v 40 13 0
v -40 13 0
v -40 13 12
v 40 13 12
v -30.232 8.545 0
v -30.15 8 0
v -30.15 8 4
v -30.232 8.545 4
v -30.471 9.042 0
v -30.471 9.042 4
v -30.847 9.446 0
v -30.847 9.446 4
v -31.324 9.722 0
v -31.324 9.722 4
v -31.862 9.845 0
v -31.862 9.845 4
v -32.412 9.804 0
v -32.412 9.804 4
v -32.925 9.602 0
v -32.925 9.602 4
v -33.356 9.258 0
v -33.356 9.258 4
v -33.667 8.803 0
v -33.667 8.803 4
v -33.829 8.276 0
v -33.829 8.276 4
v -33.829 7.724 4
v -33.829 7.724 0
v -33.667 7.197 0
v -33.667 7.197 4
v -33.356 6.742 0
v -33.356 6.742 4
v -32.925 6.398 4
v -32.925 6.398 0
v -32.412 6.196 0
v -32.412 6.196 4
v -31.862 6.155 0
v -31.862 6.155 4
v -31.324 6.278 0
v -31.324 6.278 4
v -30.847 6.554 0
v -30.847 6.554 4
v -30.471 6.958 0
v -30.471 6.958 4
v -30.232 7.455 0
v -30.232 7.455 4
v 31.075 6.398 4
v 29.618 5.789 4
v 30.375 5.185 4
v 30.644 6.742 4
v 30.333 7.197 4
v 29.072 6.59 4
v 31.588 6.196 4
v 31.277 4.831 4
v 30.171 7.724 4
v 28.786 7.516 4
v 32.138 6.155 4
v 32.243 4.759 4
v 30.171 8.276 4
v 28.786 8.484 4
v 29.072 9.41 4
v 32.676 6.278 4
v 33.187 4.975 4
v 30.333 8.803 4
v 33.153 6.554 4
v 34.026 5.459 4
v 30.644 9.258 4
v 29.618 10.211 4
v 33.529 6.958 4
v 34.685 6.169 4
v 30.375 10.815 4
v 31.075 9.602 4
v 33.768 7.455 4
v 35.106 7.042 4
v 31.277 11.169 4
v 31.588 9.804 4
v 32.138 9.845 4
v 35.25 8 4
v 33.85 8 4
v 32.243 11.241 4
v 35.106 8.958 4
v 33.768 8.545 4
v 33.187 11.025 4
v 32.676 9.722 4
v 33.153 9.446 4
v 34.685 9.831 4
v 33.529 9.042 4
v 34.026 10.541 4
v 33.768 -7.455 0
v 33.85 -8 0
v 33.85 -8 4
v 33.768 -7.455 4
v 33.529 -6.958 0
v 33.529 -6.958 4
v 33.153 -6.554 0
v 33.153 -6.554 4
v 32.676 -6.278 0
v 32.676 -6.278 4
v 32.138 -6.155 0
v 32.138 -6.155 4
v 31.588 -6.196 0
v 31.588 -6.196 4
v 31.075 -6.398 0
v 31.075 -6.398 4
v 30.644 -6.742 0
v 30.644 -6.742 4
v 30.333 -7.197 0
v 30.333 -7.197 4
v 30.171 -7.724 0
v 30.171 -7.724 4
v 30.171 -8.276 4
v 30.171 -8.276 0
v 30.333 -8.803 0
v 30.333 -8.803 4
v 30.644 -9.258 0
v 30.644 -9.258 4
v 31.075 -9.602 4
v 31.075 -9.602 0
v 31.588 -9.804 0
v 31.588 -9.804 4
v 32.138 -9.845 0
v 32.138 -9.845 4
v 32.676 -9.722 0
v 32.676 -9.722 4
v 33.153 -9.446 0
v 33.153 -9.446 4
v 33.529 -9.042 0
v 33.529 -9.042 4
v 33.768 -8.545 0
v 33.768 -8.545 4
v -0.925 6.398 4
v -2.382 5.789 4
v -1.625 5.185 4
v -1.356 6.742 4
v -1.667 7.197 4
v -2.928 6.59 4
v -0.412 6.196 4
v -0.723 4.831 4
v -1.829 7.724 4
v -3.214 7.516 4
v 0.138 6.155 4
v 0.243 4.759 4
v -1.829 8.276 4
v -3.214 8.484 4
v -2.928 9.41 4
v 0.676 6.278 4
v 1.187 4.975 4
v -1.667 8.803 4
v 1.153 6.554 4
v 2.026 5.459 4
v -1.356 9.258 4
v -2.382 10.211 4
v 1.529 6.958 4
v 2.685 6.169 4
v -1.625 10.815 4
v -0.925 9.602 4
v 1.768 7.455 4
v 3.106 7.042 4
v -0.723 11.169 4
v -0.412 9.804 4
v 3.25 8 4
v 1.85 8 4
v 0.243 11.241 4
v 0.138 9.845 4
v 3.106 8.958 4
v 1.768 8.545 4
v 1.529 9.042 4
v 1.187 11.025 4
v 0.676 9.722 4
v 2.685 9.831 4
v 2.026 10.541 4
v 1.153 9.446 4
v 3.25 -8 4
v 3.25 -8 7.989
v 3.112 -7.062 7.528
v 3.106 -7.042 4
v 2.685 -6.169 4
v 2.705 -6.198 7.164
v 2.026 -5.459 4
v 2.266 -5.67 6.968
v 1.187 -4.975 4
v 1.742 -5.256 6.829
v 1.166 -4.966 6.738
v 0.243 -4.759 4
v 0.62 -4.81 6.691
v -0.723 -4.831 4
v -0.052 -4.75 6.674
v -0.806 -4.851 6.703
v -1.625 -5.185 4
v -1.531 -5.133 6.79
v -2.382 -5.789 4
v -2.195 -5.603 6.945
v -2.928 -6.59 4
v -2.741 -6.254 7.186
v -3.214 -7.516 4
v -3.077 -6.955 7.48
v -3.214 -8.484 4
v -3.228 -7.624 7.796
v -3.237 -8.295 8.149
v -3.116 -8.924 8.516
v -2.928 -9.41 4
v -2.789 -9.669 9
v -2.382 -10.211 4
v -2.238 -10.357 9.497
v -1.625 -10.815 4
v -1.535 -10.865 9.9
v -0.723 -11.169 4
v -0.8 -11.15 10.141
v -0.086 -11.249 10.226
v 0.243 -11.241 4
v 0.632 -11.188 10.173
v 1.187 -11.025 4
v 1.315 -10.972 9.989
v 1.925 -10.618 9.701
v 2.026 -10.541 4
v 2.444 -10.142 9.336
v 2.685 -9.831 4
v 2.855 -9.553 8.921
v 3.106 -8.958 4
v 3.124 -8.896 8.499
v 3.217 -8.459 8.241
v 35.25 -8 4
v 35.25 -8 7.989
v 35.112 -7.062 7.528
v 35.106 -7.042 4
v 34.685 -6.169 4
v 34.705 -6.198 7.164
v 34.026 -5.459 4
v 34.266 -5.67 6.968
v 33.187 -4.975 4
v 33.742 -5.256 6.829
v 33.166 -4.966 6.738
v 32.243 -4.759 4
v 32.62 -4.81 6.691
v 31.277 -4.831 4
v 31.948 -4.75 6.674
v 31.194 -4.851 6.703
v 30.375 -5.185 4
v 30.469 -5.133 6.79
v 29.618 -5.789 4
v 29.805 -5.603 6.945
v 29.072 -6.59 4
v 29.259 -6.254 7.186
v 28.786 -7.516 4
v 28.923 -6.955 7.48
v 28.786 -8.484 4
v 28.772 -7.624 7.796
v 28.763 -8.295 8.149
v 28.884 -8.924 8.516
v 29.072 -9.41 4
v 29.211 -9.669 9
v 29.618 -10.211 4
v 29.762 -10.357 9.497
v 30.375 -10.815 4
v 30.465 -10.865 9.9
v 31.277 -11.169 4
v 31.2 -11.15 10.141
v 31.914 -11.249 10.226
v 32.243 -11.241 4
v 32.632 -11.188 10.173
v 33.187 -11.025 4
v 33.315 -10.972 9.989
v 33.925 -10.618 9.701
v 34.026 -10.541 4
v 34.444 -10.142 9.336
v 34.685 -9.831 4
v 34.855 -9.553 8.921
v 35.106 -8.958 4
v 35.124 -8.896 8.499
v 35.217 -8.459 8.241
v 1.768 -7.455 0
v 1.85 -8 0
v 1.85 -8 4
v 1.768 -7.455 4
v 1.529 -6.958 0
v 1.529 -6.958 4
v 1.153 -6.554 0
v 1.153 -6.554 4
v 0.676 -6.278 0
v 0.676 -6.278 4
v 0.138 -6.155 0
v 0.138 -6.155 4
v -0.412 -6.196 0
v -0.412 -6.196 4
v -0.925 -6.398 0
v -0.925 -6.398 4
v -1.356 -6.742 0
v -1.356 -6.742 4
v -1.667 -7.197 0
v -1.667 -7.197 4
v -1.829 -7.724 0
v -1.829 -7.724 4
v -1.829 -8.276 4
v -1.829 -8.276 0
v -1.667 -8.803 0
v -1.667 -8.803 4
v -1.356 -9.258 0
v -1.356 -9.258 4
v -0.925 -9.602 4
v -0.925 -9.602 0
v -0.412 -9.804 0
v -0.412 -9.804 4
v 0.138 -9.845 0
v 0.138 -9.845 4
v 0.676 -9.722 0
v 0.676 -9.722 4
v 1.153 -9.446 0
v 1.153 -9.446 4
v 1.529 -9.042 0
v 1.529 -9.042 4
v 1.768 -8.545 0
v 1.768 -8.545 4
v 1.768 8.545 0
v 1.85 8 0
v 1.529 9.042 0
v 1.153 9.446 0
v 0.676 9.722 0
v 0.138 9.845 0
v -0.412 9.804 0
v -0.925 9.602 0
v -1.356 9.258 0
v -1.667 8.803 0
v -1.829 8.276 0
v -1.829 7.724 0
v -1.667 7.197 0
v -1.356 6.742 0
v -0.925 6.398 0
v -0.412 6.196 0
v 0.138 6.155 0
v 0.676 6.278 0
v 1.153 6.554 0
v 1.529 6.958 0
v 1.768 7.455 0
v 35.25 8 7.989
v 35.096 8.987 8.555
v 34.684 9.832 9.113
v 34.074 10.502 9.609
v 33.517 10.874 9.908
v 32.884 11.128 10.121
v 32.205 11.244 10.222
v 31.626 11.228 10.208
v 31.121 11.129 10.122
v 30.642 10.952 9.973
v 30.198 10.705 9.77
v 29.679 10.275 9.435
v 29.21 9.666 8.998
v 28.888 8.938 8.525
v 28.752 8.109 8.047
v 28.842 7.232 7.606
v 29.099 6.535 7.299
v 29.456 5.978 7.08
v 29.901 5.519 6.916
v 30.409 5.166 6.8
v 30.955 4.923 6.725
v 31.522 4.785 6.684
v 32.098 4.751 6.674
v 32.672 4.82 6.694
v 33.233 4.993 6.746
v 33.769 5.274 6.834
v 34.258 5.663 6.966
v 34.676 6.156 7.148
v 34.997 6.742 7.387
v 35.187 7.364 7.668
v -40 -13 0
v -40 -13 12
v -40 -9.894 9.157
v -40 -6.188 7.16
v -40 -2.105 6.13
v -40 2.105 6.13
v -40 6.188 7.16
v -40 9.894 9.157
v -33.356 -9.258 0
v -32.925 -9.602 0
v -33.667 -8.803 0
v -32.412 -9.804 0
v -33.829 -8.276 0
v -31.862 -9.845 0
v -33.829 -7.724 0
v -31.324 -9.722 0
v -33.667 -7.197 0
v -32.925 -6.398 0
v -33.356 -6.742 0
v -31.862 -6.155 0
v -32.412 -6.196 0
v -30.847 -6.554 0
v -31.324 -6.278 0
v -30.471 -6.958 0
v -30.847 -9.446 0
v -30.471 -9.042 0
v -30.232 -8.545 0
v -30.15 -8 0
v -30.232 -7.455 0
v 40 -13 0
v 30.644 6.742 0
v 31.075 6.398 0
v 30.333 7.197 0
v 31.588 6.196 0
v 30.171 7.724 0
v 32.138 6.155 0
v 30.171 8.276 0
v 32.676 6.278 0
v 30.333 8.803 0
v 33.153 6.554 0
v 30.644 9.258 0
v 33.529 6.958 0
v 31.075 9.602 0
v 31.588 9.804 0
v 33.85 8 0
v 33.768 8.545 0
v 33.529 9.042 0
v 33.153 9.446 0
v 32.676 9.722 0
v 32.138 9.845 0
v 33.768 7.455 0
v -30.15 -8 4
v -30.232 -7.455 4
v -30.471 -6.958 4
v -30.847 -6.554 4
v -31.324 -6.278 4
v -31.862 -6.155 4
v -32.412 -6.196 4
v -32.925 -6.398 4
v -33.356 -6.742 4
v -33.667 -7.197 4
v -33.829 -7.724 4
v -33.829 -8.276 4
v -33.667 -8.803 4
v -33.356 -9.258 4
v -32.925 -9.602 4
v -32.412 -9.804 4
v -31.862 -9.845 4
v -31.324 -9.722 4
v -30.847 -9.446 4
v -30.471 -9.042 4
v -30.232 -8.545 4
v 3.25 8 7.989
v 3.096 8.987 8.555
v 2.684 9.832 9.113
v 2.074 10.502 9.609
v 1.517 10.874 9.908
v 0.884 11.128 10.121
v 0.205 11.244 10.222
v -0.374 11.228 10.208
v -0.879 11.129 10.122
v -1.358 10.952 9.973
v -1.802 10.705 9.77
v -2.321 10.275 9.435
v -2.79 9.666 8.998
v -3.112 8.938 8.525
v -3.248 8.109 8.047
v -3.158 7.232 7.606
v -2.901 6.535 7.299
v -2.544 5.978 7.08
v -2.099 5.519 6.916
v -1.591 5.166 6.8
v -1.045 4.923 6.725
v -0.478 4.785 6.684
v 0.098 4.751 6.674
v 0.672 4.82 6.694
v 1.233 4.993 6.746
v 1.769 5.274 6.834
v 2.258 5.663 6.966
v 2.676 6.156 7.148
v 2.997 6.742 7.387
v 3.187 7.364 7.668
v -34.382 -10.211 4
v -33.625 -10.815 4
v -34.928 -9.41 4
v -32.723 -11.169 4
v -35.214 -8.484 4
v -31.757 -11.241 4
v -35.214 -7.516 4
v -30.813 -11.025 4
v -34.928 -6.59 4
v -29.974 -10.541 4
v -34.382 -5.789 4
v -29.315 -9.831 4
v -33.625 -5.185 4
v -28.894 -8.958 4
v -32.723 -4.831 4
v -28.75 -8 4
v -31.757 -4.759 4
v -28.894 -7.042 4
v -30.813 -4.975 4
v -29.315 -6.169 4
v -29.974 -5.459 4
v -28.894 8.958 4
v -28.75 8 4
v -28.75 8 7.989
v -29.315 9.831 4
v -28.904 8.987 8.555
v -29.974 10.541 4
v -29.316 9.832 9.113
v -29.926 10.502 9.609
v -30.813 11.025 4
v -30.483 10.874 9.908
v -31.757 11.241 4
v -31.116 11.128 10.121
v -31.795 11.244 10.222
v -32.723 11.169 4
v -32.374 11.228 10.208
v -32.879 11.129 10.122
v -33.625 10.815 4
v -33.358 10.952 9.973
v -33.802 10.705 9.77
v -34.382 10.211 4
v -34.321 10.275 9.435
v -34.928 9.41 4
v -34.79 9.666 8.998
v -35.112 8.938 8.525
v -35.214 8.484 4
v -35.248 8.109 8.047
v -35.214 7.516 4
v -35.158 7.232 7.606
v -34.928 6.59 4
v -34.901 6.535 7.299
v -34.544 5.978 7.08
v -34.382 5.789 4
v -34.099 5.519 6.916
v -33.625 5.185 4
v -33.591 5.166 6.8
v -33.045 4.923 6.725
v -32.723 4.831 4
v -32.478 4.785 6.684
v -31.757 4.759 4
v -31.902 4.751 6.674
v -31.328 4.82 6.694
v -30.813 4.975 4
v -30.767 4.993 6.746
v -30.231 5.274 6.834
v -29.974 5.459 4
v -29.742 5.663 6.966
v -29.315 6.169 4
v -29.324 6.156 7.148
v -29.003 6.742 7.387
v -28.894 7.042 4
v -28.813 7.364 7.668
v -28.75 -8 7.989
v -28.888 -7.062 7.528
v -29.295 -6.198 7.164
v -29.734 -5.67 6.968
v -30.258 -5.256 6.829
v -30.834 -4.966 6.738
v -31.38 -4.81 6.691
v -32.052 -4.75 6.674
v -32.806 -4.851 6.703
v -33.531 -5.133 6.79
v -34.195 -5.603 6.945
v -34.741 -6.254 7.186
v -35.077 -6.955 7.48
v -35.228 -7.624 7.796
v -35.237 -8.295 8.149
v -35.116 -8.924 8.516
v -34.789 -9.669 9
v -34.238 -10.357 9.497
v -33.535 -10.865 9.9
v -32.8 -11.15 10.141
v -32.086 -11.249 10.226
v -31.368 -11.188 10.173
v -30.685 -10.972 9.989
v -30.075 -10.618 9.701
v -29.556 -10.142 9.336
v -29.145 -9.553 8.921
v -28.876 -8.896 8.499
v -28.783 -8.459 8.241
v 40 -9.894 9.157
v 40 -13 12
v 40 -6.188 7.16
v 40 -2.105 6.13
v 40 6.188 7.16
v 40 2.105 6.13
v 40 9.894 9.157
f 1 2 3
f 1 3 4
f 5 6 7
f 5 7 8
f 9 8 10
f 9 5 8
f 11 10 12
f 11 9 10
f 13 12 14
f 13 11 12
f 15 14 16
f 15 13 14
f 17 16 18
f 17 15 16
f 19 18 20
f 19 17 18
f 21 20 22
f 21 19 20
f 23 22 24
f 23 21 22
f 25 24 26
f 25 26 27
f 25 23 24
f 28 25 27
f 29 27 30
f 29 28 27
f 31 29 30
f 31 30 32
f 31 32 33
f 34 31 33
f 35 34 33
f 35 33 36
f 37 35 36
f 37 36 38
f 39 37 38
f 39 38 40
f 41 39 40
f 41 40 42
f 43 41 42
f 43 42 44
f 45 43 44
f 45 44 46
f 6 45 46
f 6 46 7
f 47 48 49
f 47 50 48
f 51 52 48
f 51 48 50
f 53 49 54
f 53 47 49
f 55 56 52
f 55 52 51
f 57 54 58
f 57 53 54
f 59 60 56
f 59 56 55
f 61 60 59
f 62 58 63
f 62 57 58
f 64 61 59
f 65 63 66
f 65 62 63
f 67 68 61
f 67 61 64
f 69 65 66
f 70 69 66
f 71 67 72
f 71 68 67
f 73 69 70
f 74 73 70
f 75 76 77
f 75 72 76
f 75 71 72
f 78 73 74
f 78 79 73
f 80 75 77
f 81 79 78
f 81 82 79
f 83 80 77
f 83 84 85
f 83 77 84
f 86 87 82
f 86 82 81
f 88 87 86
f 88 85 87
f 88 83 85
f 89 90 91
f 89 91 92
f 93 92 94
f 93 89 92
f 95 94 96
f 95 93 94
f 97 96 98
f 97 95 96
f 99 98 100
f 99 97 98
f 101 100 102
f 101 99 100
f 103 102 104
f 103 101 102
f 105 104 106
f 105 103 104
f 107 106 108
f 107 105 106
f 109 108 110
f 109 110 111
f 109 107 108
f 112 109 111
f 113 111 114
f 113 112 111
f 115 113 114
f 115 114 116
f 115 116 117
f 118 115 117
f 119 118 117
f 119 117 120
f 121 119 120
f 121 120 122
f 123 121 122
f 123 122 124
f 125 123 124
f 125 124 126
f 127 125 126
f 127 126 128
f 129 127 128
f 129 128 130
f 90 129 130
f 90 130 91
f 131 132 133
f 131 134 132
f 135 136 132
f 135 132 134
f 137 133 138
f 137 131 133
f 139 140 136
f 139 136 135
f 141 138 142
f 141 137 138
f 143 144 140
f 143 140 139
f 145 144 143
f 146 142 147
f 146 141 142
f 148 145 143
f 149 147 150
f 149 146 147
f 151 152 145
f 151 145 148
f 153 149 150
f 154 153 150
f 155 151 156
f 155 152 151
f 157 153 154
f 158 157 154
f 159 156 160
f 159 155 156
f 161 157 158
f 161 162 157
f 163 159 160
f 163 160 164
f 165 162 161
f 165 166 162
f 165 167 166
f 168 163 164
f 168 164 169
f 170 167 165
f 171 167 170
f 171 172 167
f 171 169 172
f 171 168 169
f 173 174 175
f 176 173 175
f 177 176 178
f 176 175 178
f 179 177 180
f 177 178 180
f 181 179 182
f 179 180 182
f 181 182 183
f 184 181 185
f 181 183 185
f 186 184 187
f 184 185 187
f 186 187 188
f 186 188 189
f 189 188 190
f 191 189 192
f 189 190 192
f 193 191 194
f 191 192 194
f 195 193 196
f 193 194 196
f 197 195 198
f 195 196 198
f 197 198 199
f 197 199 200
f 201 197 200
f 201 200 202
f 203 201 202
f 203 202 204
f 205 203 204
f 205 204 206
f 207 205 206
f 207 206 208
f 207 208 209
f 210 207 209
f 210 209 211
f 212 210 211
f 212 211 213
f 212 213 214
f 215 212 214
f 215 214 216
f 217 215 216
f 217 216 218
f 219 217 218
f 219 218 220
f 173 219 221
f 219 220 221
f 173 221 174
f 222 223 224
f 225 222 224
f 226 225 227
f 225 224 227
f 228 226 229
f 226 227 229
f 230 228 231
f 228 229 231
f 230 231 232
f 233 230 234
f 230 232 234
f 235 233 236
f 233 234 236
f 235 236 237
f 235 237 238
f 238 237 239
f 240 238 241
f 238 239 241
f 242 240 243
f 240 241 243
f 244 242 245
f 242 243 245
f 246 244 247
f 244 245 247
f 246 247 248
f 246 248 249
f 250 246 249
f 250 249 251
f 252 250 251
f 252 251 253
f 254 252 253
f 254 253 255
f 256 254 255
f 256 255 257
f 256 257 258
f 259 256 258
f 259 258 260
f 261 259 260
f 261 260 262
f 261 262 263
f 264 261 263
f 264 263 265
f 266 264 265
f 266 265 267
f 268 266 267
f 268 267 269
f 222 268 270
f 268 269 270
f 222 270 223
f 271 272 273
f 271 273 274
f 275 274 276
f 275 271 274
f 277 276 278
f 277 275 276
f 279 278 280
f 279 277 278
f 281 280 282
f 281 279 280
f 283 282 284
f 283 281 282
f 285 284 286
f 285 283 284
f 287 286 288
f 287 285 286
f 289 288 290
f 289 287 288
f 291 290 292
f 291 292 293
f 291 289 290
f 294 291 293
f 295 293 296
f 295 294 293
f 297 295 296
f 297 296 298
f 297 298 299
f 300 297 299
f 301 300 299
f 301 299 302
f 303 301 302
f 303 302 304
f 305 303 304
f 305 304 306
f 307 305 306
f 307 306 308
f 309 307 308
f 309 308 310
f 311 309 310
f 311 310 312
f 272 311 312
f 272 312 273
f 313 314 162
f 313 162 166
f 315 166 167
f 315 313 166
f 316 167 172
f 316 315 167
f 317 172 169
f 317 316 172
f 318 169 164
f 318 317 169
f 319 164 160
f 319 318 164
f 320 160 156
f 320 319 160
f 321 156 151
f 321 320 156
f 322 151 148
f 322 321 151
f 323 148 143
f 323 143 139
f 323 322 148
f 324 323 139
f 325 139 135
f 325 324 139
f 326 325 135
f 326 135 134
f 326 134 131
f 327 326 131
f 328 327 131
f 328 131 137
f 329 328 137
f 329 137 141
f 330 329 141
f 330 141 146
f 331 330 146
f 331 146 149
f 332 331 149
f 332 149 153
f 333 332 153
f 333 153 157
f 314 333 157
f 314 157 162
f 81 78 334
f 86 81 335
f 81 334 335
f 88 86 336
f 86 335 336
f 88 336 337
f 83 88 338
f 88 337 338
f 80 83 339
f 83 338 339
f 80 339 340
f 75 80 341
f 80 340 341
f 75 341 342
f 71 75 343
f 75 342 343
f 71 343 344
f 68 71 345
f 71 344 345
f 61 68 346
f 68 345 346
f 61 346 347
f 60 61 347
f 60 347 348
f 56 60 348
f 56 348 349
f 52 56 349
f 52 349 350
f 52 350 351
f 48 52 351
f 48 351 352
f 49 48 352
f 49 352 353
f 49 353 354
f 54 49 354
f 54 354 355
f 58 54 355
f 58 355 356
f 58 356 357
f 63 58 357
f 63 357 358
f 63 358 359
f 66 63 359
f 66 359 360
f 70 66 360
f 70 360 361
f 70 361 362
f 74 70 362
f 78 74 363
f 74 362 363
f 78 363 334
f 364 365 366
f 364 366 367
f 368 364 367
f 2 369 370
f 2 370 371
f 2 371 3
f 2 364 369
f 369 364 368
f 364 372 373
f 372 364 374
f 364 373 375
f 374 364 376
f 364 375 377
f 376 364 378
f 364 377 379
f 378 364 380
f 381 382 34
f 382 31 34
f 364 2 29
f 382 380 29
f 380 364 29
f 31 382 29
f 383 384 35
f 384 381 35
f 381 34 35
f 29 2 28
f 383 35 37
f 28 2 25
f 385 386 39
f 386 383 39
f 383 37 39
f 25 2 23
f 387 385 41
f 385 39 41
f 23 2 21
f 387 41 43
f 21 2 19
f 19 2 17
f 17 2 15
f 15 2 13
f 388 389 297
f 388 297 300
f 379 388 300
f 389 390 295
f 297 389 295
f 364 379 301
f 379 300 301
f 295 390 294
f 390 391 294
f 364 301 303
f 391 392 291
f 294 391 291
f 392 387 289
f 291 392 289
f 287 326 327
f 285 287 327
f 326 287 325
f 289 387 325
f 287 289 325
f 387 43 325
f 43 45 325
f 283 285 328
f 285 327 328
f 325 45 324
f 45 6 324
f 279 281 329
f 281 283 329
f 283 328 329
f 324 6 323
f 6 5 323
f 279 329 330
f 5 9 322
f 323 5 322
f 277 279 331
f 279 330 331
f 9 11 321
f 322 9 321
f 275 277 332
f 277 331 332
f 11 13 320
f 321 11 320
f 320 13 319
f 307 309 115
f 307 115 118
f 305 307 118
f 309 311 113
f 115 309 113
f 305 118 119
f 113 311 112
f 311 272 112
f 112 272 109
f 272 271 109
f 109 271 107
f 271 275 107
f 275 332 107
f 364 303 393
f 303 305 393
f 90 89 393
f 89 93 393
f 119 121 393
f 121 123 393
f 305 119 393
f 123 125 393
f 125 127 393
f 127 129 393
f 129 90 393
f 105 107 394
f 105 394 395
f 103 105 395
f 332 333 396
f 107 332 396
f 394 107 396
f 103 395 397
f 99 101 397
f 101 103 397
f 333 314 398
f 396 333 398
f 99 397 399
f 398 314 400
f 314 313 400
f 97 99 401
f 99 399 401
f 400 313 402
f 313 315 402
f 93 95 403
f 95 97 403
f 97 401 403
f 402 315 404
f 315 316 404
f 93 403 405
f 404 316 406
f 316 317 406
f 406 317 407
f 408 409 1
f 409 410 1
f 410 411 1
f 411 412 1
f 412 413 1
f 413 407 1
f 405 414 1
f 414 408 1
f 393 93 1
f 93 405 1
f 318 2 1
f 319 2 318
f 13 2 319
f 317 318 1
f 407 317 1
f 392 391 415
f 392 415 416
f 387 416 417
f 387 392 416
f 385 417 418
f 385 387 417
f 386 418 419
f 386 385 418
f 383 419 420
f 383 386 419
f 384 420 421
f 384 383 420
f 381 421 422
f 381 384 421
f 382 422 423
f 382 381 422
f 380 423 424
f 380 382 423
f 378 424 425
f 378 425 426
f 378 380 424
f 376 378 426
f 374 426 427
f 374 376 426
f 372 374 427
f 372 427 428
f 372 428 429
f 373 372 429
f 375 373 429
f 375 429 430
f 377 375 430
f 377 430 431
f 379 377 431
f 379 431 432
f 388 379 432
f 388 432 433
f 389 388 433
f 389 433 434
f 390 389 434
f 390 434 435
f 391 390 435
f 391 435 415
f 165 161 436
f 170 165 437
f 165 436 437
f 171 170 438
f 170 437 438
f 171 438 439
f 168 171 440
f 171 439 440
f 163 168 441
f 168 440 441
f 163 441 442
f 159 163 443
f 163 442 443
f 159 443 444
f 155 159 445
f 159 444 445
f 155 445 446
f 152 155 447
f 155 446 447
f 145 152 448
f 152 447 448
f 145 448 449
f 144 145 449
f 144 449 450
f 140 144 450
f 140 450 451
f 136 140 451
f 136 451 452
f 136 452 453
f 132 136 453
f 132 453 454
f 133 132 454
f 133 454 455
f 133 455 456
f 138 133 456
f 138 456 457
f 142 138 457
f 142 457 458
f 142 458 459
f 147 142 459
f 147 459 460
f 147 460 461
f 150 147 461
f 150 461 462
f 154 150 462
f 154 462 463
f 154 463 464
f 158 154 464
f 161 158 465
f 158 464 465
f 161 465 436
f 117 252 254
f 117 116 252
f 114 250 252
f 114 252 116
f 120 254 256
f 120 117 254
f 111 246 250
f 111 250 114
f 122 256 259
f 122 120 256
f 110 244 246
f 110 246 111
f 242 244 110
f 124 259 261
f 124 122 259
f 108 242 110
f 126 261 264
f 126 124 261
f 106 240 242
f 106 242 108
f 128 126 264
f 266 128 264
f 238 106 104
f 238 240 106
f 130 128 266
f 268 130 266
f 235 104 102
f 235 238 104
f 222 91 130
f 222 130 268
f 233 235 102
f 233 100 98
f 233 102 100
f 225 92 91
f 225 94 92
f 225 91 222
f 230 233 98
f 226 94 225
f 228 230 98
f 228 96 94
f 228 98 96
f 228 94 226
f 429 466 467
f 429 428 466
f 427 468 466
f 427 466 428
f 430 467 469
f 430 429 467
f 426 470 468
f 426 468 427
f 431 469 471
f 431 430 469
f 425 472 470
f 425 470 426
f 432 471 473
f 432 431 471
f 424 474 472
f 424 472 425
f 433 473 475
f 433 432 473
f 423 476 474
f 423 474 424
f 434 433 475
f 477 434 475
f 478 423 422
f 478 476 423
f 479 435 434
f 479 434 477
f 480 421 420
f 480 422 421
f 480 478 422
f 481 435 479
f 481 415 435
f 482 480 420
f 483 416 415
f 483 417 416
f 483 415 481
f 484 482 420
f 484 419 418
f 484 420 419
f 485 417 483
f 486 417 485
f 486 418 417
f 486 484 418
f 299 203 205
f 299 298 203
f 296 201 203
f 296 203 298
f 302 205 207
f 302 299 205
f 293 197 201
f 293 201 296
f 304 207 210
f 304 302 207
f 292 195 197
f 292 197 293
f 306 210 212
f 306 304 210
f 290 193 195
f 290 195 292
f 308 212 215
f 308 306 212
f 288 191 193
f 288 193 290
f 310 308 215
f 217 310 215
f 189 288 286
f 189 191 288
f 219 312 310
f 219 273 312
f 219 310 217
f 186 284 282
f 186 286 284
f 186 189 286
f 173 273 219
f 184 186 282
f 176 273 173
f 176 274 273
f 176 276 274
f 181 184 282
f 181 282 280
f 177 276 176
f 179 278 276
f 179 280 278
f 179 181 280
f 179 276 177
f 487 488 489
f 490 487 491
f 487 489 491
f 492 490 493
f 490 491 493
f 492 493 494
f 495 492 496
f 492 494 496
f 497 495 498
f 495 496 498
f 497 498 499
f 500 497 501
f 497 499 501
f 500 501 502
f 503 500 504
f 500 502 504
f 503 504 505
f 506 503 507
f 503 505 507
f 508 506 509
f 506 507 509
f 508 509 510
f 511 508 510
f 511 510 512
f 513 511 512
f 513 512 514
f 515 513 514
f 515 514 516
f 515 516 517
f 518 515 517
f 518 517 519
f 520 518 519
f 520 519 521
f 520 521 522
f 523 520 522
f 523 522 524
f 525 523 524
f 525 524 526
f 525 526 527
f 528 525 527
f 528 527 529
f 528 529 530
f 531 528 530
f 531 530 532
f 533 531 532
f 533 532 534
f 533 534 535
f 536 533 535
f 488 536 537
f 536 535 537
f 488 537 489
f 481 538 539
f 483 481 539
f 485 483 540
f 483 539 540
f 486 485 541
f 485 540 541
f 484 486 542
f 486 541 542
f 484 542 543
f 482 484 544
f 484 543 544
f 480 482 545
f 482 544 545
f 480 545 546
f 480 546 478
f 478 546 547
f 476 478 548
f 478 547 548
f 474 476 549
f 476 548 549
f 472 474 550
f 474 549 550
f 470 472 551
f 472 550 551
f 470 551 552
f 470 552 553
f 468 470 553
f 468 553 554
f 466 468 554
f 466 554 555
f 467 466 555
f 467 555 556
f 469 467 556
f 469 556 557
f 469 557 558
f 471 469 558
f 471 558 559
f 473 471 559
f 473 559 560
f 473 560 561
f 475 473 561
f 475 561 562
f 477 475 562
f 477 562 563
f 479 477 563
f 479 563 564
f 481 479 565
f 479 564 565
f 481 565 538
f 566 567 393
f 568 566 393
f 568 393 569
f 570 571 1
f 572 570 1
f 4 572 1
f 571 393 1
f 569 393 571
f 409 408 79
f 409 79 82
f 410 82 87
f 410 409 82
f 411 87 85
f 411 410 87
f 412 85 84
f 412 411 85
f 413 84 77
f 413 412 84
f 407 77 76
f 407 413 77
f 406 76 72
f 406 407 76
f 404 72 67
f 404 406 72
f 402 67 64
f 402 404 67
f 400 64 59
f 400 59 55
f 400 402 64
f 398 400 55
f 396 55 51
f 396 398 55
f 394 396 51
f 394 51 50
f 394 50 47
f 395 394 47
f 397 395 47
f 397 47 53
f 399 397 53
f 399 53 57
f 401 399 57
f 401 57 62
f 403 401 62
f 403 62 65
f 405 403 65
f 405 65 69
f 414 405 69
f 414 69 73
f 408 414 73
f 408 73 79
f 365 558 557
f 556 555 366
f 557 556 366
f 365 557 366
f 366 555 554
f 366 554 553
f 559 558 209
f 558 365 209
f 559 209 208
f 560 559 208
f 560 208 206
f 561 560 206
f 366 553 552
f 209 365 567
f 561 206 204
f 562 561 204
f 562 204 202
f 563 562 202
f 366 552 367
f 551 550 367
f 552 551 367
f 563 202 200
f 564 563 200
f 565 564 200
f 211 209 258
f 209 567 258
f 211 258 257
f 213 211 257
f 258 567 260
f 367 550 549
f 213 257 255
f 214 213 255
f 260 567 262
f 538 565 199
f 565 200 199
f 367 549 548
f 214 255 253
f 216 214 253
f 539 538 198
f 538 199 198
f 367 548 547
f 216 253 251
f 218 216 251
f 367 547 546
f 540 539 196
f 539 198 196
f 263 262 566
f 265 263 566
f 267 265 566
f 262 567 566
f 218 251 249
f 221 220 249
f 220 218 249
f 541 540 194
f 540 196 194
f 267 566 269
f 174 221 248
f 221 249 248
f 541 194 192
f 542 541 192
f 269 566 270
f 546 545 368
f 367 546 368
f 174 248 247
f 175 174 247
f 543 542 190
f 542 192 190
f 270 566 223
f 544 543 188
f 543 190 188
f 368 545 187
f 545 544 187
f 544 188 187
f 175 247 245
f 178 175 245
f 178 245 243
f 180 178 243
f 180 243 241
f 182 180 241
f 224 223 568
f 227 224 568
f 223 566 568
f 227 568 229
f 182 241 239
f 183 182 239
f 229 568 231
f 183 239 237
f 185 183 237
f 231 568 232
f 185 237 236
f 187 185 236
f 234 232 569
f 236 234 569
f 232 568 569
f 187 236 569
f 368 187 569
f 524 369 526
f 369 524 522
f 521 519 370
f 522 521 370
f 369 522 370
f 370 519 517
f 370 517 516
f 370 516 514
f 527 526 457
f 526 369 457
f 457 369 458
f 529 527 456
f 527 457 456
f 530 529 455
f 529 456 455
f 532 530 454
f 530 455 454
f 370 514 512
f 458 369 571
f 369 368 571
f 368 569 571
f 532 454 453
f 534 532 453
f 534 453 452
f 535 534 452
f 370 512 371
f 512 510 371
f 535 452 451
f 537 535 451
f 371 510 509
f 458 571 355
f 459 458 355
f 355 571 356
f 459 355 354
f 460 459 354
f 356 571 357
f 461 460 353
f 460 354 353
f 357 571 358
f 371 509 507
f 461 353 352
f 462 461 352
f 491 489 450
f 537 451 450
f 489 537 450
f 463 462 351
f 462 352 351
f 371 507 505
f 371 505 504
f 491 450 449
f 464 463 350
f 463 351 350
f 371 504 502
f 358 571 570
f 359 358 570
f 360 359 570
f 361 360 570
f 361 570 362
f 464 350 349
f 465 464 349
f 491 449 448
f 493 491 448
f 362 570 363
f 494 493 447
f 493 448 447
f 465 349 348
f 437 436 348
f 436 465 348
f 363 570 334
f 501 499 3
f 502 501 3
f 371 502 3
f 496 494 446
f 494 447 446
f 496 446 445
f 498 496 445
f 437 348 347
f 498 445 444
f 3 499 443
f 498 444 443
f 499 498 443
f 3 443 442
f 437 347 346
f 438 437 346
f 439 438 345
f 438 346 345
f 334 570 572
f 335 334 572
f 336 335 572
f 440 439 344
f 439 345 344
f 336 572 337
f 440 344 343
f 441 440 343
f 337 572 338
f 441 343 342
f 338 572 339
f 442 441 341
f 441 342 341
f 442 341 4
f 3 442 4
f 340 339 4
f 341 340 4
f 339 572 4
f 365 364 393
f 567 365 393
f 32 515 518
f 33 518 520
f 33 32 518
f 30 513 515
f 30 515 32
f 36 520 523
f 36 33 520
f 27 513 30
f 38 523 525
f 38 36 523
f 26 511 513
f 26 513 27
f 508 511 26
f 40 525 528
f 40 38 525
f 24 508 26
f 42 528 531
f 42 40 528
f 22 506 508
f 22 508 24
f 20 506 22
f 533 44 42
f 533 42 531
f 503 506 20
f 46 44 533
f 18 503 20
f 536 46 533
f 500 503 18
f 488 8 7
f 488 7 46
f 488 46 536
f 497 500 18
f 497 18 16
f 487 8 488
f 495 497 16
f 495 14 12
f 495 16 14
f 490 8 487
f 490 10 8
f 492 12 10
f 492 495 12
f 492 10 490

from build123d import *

# Parameters (mm, degrees)
F0_W     = 80
F0_H     = 26
F0_R     = 1.85
F1_DEPTH = 25
F3_R     = 3.25
F3_R_2   = 1.85
F4_DEPTH = 21
F5_DEPTH = 100


with BuildPart() as f1:
    # F0 (on Top) → F1 (new body)
    with BuildSketch(Plane.XY):
        Rectangle(F0_W, F0_H)
        with Locations((-32, -8)):
            Circle(F0_R, mode=Mode.SUBTRACT)
        with Locations((0, -8)):
            Circle(F0_R, mode=Mode.SUBTRACT)
        with Locations((32, -8)):
            Circle(F0_R, mode=Mode.SUBTRACT)
        with Locations((-32, 8)):
            Circle(F0_R, mode=Mode.SUBTRACT)
        with Locations((0, 8)):
            Circle(F0_R, mode=Mode.SUBTRACT)
        with Locations((32, 8)):
            Circle(F0_R, mode=Mode.SUBTRACT)
    extrude(amount=F1_DEPTH)

    # F3 (on face) → F4 (cut)
    with BuildSketch(Plane.XY.offset(25)):
        with Locations((-32, -8)):
            Circle(F3_R)
        with Locations((-32, -8)):
            Circle(F3_R_2, mode=Mode.SUBTRACT)
        with Locations((-32, 8)):
            Circle(F3_R)
        with Locations((-32, 8)):
            Circle(F3_R_2, mode=Mode.SUBTRACT)
        with Locations((0, 8)):
            Circle(F3_R)
        with Locations((0, 8)):
            Circle(F3_R_2, mode=Mode.SUBTRACT)
        with Locations((0, -8)):
            Circle(F3_R)
        with Locations((0, -8)):
            Circle(F3_R_2, mode=Mode.SUBTRACT)
        with Locations((32, 8)):
            Circle(F3_R)
        with Locations((32, 8)):
            Circle(F3_R_2, mode=Mode.SUBTRACT)
        with Locations((32, -8)):
            Circle(F3_R)
        with Locations((32, -8)):
            Circle(F3_R_2, mode=Mode.SUBTRACT)
    extrude(amount=-F4_DEPTH, mode=Mode.SUBTRACT)

    # F2 (on face) → F5 (cut)
    with BuildSketch(Plane.YZ.offset(40)):
        with BuildLine():
            Line((-13, 25), (-13, 12))
            ThreePointArc((-13, 12), (0, 6), (13, 12))
            Line((13, 12), (13, 25))
            Line((13, 25), (-13, 25))
        make_face()
    extrude(amount=-F5_DEPTH, mode=Mode.SUBTRACT)


solid = f1.part
